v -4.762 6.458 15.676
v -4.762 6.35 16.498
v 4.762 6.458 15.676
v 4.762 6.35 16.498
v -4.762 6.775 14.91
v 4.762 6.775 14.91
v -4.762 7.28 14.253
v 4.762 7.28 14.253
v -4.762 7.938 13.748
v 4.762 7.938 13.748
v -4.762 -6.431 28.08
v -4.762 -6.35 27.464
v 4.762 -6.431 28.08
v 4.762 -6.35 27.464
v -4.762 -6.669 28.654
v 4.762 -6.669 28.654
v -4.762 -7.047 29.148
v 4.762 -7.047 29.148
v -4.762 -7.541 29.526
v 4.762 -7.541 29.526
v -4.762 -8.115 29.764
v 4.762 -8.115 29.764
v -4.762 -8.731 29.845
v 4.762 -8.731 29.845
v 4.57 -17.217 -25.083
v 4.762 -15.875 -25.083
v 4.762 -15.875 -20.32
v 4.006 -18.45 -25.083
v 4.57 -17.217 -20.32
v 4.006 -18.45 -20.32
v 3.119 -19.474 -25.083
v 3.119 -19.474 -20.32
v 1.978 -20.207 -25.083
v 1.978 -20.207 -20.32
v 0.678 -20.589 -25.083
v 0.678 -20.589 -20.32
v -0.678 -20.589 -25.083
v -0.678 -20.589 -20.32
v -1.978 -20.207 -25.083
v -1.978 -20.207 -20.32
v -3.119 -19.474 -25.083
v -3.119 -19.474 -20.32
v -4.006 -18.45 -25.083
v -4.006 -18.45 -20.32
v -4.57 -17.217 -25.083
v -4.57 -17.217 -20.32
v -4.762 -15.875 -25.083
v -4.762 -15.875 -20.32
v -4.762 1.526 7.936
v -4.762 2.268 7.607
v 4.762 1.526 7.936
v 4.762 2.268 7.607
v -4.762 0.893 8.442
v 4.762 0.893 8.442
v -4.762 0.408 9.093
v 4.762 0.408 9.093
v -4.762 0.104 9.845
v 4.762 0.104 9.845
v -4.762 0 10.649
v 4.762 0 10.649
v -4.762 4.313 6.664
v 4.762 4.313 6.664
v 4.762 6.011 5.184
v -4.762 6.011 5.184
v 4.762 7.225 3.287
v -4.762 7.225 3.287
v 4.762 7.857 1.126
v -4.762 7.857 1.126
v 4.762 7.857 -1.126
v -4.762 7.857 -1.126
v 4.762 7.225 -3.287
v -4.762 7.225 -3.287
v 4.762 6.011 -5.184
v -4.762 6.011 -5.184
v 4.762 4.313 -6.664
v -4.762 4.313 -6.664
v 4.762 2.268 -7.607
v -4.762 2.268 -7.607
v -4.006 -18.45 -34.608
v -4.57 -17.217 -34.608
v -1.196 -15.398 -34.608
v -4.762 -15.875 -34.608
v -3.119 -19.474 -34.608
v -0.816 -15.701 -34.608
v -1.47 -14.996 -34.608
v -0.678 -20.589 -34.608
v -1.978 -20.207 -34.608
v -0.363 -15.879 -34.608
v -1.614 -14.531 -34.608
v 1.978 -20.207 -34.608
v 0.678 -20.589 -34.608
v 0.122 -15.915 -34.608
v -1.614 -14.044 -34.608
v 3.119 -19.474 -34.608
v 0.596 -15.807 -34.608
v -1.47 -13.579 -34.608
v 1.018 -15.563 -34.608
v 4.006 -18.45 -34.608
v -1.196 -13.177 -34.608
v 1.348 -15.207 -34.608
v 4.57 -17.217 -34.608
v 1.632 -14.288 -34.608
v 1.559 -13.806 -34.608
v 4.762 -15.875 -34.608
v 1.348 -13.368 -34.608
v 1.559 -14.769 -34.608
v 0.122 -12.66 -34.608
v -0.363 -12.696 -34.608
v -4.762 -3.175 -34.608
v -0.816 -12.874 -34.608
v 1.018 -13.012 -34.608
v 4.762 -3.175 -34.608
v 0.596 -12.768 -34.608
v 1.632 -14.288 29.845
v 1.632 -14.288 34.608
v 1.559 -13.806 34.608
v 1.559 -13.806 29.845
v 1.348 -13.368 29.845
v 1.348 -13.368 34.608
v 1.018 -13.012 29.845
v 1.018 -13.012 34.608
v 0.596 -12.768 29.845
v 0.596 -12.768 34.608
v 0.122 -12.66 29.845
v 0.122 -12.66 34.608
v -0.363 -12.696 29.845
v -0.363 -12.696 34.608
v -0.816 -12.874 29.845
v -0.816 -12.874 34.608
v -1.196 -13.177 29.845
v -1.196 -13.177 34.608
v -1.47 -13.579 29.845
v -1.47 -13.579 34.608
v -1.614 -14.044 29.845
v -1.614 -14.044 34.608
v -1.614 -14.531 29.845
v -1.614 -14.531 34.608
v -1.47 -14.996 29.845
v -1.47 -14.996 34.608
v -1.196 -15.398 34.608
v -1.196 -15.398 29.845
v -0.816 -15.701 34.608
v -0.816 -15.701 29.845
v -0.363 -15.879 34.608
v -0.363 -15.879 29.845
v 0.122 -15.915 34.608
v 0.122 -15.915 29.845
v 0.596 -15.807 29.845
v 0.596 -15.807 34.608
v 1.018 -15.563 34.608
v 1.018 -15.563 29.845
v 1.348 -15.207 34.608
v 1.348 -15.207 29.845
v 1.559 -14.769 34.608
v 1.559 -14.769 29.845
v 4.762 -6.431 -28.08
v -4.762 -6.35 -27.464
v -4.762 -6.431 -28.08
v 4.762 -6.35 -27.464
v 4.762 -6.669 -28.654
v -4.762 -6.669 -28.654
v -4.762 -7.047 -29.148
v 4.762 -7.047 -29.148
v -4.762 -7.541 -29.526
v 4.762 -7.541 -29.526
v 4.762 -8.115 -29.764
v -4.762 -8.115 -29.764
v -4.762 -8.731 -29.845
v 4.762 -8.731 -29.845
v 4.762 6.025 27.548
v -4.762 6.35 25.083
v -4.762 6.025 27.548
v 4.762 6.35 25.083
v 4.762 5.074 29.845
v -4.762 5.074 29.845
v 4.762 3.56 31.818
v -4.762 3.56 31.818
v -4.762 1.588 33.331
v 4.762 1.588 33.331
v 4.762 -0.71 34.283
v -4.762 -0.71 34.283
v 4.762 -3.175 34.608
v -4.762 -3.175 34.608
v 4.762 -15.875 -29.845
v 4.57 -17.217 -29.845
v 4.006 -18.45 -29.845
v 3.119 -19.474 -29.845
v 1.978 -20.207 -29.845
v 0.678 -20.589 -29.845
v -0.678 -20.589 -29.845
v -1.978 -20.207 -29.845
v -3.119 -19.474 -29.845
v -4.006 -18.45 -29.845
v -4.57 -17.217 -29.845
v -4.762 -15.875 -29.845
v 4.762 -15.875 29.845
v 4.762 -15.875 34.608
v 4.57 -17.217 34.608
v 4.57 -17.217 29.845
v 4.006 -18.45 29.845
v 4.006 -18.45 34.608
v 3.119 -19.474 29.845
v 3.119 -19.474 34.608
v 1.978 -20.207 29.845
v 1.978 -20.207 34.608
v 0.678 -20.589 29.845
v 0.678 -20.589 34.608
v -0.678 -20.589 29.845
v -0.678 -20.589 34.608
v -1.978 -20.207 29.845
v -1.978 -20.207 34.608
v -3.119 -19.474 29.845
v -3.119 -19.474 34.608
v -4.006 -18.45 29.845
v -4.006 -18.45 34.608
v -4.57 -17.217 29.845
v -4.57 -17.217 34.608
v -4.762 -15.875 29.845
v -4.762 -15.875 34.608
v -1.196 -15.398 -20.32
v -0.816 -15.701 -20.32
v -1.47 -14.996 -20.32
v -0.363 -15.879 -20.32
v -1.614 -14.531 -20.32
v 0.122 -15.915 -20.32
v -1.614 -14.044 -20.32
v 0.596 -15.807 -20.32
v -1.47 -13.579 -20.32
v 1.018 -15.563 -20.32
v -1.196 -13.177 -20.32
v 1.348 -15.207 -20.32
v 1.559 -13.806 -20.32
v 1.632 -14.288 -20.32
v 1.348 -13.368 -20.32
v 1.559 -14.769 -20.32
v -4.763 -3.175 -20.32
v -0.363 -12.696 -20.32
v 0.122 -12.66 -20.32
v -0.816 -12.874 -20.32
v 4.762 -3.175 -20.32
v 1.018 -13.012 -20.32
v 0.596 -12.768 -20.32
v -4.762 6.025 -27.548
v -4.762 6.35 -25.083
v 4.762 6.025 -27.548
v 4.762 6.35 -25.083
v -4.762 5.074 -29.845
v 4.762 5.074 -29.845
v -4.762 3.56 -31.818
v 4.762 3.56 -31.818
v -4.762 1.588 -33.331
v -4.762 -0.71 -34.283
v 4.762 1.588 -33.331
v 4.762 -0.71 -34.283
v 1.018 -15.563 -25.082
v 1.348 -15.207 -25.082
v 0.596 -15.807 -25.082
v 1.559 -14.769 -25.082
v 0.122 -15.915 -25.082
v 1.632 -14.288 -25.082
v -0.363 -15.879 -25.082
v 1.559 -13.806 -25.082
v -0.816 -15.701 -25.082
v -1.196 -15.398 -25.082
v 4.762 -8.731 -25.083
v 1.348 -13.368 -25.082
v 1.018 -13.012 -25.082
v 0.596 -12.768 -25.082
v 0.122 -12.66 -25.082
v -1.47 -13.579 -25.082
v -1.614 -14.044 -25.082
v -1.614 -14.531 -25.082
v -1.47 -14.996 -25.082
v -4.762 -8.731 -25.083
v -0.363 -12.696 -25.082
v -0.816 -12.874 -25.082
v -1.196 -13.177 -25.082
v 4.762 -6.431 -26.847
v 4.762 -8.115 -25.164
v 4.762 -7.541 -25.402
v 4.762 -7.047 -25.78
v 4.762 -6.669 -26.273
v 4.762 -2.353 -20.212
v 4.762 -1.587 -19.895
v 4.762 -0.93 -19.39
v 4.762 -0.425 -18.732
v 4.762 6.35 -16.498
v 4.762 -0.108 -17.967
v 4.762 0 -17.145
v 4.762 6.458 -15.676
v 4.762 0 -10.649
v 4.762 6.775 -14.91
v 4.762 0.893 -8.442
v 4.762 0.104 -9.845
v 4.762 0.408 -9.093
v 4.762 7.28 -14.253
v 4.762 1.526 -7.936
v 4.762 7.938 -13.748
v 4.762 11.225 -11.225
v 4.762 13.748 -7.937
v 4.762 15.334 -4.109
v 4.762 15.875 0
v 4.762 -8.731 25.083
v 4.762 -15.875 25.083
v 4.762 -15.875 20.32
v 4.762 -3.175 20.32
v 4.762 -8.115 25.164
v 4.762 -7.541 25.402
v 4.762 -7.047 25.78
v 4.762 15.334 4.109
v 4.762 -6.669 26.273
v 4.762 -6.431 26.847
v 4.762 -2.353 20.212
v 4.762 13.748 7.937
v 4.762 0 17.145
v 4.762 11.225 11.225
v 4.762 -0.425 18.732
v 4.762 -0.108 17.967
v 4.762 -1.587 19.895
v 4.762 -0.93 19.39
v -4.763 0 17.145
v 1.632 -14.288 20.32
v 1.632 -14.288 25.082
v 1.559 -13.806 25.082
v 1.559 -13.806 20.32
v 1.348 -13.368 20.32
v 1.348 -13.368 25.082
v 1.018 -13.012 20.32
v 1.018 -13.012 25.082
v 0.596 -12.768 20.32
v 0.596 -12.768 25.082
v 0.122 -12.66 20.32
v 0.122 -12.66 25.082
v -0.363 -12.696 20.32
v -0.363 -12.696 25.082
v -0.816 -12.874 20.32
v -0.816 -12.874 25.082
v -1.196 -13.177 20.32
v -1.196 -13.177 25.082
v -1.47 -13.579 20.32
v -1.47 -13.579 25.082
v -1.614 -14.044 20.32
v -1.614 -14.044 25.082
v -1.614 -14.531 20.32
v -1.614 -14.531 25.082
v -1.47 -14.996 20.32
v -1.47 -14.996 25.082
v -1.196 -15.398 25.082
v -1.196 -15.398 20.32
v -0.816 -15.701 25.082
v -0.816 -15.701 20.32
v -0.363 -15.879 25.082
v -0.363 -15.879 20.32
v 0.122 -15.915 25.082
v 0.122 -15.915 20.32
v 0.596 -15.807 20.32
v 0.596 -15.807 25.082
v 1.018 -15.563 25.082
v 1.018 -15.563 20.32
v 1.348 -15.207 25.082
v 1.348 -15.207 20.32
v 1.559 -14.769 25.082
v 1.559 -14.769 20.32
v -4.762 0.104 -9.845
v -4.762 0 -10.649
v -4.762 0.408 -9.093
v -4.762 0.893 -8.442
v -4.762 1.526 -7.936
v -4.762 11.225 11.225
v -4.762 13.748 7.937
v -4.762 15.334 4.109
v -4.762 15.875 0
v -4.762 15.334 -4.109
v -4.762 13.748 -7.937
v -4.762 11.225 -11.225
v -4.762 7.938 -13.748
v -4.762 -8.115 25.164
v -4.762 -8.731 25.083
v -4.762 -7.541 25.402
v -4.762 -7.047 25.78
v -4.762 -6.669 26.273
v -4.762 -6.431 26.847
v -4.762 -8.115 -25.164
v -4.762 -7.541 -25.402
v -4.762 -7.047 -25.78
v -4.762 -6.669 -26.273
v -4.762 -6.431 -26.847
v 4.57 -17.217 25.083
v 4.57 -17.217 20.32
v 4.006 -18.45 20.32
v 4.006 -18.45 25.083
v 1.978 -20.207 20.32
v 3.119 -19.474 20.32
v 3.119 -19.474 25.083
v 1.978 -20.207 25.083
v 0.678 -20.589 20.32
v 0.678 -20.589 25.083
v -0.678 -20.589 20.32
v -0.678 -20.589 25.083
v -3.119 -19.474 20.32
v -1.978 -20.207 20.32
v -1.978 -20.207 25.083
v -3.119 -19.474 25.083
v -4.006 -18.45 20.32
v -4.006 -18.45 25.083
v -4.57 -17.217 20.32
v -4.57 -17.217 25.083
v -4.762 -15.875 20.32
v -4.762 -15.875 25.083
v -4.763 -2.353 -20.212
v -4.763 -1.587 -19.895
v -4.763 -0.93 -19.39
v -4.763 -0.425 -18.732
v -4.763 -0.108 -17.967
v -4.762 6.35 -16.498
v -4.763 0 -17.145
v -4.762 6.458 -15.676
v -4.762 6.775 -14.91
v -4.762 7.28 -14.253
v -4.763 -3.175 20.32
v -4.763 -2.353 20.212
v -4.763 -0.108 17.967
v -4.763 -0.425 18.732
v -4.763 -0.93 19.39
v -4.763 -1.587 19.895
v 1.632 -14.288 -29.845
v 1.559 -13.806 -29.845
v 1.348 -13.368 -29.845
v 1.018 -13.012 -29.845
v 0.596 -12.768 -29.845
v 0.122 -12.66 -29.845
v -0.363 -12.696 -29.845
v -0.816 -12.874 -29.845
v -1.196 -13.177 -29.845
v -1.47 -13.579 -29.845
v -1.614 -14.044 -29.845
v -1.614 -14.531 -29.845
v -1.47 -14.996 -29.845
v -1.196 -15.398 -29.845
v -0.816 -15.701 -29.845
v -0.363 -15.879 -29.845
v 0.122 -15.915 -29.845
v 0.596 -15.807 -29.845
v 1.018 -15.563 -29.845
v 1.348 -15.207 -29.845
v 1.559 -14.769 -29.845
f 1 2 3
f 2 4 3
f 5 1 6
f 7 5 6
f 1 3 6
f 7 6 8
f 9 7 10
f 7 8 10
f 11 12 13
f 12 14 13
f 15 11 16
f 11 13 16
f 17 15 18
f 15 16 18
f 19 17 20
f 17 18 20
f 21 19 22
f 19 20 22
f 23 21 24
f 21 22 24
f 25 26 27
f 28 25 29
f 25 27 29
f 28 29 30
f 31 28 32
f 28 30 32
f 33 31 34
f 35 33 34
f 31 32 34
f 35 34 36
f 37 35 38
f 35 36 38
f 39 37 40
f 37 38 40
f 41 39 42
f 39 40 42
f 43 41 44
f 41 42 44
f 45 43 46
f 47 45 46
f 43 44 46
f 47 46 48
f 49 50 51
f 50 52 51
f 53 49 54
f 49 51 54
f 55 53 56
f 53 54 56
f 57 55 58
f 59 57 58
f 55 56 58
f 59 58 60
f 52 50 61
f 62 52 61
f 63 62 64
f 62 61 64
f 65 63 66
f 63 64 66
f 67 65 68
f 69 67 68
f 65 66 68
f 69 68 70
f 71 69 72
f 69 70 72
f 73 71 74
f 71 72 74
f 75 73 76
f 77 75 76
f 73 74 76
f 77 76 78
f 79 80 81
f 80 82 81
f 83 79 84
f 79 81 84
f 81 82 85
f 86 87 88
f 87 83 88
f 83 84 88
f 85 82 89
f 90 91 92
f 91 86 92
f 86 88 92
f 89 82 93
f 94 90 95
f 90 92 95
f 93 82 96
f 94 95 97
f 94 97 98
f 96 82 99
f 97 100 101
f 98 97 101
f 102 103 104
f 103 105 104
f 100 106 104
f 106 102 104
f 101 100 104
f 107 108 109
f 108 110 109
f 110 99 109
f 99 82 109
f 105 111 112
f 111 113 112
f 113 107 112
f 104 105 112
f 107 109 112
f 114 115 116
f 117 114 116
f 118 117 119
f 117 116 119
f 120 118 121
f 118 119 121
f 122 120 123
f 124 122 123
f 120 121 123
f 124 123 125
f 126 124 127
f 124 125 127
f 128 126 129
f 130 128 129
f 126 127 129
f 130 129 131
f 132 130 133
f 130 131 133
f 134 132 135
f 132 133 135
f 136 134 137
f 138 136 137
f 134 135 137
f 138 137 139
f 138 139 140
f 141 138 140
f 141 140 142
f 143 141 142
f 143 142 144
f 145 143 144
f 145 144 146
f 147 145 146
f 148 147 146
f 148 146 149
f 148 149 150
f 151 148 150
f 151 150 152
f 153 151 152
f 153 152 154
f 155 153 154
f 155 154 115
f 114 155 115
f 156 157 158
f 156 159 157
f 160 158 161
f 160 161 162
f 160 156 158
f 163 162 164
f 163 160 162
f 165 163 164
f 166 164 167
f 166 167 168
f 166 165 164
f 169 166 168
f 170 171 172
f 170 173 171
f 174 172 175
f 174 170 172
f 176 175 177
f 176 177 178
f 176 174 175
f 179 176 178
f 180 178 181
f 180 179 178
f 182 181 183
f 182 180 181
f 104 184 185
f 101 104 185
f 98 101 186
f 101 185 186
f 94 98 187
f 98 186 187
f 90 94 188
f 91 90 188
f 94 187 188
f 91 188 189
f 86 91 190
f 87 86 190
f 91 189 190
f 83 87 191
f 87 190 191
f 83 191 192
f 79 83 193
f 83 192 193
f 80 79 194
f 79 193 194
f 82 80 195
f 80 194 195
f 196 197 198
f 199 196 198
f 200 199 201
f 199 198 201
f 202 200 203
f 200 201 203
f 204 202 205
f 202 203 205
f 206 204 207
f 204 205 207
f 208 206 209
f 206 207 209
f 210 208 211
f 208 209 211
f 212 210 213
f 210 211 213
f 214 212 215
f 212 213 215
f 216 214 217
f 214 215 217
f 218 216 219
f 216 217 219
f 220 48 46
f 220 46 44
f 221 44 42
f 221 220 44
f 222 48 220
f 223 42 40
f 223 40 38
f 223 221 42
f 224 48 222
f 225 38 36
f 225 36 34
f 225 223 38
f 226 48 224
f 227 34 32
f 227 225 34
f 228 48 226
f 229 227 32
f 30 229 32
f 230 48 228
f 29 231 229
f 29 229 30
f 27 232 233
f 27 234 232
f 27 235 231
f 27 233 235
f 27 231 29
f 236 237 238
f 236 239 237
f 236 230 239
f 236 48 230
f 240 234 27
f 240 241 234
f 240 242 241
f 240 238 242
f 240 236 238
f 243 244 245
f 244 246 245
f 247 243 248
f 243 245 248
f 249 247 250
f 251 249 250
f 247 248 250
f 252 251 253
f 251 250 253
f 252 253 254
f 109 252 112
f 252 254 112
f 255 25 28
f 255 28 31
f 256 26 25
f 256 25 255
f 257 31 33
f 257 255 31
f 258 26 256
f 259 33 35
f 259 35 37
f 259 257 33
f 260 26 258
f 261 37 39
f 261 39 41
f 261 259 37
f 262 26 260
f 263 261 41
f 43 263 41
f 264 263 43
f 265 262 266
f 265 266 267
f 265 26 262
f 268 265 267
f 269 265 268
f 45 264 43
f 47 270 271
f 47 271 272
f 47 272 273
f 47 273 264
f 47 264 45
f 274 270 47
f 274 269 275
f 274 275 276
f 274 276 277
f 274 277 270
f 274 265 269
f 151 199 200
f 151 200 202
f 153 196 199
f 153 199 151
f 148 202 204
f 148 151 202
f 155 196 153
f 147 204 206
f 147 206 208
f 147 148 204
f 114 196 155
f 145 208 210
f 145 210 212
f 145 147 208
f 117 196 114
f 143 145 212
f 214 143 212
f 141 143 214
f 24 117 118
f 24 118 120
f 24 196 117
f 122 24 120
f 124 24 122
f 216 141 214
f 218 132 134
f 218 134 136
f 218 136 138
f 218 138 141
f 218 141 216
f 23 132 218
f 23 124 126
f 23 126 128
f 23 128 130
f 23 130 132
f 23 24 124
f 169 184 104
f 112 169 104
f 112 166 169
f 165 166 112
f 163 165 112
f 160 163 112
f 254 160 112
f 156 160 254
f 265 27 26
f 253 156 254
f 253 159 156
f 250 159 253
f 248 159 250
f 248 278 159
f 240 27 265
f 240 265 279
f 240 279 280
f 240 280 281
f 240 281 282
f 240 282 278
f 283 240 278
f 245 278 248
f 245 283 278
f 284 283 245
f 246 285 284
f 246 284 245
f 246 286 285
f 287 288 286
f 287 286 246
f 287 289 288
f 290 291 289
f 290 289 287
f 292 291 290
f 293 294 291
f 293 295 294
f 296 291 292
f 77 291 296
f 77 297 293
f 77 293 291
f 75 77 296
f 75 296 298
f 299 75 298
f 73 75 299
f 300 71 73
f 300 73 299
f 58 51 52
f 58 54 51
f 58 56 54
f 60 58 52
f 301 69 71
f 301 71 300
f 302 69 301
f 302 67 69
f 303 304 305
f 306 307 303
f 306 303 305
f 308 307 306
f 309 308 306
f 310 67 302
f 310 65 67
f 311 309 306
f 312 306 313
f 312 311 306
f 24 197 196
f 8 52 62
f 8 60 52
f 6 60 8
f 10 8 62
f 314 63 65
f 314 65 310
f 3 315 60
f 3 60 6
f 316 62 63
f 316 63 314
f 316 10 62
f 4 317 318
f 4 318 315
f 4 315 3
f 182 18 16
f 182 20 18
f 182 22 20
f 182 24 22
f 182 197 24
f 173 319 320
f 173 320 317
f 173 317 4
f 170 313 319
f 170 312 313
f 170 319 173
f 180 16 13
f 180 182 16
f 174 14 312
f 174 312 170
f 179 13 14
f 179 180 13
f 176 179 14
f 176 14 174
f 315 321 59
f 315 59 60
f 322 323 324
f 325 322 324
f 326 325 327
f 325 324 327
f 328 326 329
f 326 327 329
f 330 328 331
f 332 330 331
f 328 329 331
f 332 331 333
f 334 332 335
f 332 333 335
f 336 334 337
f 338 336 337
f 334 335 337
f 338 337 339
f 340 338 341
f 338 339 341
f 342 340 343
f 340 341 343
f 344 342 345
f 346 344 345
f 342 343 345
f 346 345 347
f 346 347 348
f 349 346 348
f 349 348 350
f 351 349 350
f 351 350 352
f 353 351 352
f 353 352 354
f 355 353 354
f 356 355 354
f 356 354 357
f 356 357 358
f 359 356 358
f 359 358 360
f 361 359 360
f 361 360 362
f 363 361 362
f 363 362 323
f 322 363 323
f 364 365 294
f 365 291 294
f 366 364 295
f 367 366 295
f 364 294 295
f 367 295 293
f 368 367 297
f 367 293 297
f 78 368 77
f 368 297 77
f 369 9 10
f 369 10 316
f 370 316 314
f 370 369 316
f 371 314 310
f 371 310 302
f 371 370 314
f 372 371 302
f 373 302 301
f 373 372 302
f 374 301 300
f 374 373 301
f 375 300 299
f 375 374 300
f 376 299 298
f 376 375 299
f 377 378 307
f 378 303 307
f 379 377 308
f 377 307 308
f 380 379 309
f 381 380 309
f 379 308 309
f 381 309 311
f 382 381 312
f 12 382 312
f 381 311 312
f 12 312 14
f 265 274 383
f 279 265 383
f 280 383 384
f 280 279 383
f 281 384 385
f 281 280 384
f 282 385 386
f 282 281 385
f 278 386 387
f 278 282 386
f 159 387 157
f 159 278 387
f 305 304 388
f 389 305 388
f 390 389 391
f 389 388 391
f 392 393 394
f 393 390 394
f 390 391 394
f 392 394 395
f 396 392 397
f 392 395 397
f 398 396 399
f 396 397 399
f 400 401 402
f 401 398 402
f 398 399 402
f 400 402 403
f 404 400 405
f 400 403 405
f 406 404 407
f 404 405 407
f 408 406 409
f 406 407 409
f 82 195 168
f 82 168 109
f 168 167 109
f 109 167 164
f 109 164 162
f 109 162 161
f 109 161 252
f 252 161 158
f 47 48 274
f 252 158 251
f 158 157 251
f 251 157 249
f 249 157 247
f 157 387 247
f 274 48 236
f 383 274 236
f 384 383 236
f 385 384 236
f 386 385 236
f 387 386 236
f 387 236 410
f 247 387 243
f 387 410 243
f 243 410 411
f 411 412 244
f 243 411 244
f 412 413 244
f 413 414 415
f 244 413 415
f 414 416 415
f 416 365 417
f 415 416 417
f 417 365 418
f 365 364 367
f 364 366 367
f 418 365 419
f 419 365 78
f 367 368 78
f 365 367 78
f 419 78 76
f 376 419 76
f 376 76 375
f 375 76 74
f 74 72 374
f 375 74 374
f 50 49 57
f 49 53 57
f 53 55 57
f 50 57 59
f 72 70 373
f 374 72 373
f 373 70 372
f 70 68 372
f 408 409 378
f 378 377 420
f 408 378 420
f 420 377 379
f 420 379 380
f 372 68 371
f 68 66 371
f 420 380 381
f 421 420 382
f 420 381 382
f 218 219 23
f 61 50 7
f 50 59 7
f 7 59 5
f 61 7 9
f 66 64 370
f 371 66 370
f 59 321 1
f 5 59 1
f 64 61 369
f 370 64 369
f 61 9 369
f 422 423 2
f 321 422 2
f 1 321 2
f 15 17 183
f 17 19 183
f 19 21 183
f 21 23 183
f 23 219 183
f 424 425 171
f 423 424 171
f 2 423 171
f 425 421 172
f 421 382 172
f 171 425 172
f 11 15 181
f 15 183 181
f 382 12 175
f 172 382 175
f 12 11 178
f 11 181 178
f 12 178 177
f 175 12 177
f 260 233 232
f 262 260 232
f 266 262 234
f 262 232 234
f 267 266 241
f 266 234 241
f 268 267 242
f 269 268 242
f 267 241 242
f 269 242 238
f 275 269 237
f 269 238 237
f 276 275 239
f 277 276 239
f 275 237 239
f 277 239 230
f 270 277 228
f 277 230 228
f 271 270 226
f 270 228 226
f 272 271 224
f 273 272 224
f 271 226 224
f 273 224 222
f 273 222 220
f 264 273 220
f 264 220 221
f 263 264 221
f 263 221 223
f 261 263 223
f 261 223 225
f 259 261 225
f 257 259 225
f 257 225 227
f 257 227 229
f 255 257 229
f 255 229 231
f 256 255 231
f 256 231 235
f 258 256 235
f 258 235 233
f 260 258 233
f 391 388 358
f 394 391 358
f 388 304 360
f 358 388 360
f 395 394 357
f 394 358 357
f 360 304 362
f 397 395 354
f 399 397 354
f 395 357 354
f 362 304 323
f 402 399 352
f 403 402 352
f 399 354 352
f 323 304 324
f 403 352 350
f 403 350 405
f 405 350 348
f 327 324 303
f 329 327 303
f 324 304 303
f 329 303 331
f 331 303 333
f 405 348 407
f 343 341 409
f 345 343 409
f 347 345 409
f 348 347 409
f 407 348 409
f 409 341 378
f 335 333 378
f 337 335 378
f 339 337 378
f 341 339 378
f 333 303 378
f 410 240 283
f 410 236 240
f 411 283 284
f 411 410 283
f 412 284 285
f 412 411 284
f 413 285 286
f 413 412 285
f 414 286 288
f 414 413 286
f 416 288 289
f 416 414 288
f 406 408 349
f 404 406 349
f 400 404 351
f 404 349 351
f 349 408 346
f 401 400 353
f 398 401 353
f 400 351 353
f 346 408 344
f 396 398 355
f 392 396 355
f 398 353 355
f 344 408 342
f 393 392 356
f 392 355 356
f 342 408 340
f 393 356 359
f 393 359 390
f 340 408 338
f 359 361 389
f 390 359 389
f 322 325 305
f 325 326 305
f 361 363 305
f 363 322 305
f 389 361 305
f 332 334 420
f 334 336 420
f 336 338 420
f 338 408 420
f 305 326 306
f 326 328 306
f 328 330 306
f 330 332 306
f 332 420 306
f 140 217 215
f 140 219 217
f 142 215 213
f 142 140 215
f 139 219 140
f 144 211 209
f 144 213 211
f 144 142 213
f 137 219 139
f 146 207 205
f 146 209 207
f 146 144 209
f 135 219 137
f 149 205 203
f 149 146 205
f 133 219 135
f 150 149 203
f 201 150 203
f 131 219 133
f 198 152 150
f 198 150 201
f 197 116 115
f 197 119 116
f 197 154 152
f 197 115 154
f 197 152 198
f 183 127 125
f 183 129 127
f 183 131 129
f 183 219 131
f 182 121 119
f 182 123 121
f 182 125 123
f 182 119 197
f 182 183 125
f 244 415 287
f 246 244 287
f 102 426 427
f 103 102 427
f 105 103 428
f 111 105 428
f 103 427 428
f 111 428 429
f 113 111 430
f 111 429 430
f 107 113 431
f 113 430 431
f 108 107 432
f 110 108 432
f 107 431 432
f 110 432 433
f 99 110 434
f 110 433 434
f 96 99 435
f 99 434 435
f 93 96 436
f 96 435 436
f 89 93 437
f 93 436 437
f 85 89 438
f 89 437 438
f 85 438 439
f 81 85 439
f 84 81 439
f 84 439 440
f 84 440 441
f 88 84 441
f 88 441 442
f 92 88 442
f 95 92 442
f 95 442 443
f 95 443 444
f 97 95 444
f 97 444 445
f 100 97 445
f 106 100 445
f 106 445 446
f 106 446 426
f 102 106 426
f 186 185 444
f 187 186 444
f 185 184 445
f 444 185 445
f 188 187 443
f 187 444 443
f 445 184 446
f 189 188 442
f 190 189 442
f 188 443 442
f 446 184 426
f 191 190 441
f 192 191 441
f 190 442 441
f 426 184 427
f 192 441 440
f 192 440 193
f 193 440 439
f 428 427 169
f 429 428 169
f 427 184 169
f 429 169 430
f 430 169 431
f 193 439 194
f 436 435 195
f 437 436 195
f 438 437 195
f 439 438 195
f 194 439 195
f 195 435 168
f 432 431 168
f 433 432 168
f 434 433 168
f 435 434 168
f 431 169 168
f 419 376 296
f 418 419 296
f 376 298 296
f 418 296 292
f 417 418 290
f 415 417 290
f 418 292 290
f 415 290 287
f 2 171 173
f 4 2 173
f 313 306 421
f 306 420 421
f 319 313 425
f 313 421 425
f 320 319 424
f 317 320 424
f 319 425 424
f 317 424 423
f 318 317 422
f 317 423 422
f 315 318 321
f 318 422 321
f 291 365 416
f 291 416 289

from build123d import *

# Parameters (mm, degrees)
BOSS_EXTRUDE1_DEPTH   = 34.6075
CUT_EXTRUDE1_START    = -4.7625
CUT_EXTRUDE1_DEPTH    = 4.7625
CUT_EXTRUDE2_START    = 9.525
CUT_EXTRUDE2_DEPTH    = 4.7625
CUT_EXTRUDE3_START    = -4.7625
CUT_EXTRUDE3_DEPTH    = 40.64
BOSS_EXTRUDE3_START   = 34.6075
SKETCH7_W             = 9.525
SKETCH7_H             = 6.35
BOSS_EXTRUDE3_DEPTH   = 69.215
FILLET1_R             = 3.175
FILLET2_R             = 2.38125
FILLET3_R             = 2.38125
BOSS_EXTRUDE4_DEPTH   = 9.525
CUT_EXTRUDE4_DEPTH    = 42.40423997
FILLET4_R             = 3.175
FILLET5_R             = 9.525
F_4_CLEARANCE_HOLE1_D = 3.2639


with BuildPart() as part:
    # Sketch1 → Boss-Extrude1 (new, symmetric)
    with BuildSketch(Plane.XY):
        with BuildLine():
            Line((-4.7625, 0), (4.7625, 0))
            Line((4.7625, 0), (4.7625, -15.875))
            ThreePointArc((4.7625, -15.875), (0, -20.6375), (-4.7625, -15.875))
            Line((-4.7625, -15.875), (-4.7625, 0))
        make_face()
    extrude(amount=BOSS_EXTRUDE1_DEPTH, both=True)

    # Sketch2 → Cut-Extrude1 (cut)
    with BuildSketch(Plane.XY.offset(34.6075).offset(CUT_EXTRUDE1_START)):
        with BuildLine():
            Line((-4.7625, -15.875), (-4.7625, -6.35))
            Line((-4.7625, -6.35), (4.7625, -6.35))
            Line((4.7625, -6.35), (4.7625, -15.875))
            ThreePointArc((4.7625, -15.875), (0, -20.6375), (-4.7625, -15.875))
        make_face()
    extrude(amount=-CUT_EXTRUDE1_DEPTH, mode=Mode.SUBTRACT)

    # Sketch3 → Cut-Extrude2 (cut)
    with BuildSketch(Plane.XY.offset(-34.6075).offset(CUT_EXTRUDE2_START)):
        with BuildLine():
            Line((-4.7625, -15.875), (-4.7625, -6.35))
            Line((-4.7625, -6.35), (4.7625, -6.35))
            Line((4.7625, -6.35), (4.7625, -15.875))
            ThreePointArc((4.7625, -15.875), (0, -20.6375), (-4.7625, -15.875))
        make_face()
    extrude(amount=-CUT_EXTRUDE2_DEPTH, mode=Mode.SUBTRACT)

    # Sketch5 → Cut-Extrude3 (cut)
    with BuildSketch(Plane.XY.offset(25.0825).offset(CUT_EXTRUDE3_START)):
        with BuildLine():
            Line((4.7625, -15.875), (4.7625, 0))
            Line((4.7625, 0), (-4.7625, 0))
            Line((-4.7625, 0), (-4.7625, -15.875))
            ThreePointArc((-4.7625, -15.875), (0, -20.6375), (4.7625, -15.875))
        make_face()
    extrude(amount=-CUT_EXTRUDE3_DEPTH, mode=Mode.SUBTRACT)


with BuildPart() as cut_extrude3_piece_1:
    # of the separate pieces the step leaves, piece 1, a body of its own (cut_extrude3_pieces)
    add(part.part.solids().sort_by_distance((-4.7625, 0, 20.32))[0])



with BuildPart() as cut_extrude3_piece_2:
    # of the separate pieces the step leaves, piece 2, a body of its own (cut_extrude3_pieces)
    add(part.part.solids().sort_by_distance((-4.7625, -15.875, -34.6075))[0])


with BuildPart() as cut_extrude3_piece_1_1:
    add(cut_extrude3_piece_1.part)

    add(cut_extrude3_piece_2.part)  # Boss-Extrude3 merges Cut-Extrude3 piece 2
    # Sketch7 → Boss-Extrude3 (add)
    with BuildSketch(Plane.XY.offset(BOSS_EXTRUDE3_START)):
        with Locations((0, 3.175)):
            Rectangle(SKETCH7_W, SKETCH7_H)
    extrude(amount=-BOSS_EXTRUDE3_DEPTH)

    # Fillet1
    fillet1_edges = [cut_extrude3_piece_1_1.edges().sort_by_distance(p)[0] for p in [
        (0, 0, 20.32),
        (0, 0, -20.32),
    ]]
    fillet(fillet1_edges, radius=FILLET1_R)

    # Fillet2
    fillet2_edges = [cut_extrude3_piece_1_1.edges().sort_by_distance(p)[0] for p in [
        (0, -6.35, -25.0825),
        (0, -6.35, -29.845),
    ]]
    fillet(fillet2_edges, radius=FILLET2_R - 0.0001)  # a hair under: the kernel refuses the full size

    # Fillet3
    fillet3_edges = [cut_extrude3_piece_1_1.edges().sort_by_distance(p)[0] for p in [
        (0, -6.35, 29.845),
        (0, -6.35, 25.0825),
    ]]
    fillet(fillet3_edges, radius=FILLET3_R - 0.0001)  # a hair under: the kernel refuses the full size

    # Sketch8 → Boss-Extrude4 (add)
    with BuildSketch(Plane.ZY.offset(4.7625)):
        with BuildLine():
            Line((-14.549677831, 6.35), (14.549677831, 6.35))
            ThreePointArc((14.549677831, 6.35), (0, 15.875), (-14.549677831, 6.35))
        make_face()
    extrude(amount=-BOSS_EXTRUDE4_DEPTH)

    # Sketch9 → Cut-Extrude4 (cut, through all)
    with BuildSketch(Plane.ZY.offset(4.7625)):
        with BuildLine():
            Line((-7.9375, 0), (7.9375, 0))
            ThreePointArc((7.9375, 0), (0, 7.9375), (-7.9375, 0))
        make_face()
    extrude(amount=-CUT_EXTRUDE4_DEPTH, mode=Mode.SUBTRACT)

    # Fillet4
    fillet4_edges = [cut_extrude3_piece_1_1.edges().sort_by_distance(p)[0] for p in [
        (0, 6.35, -14.549677831),
        (0, 6.35, 14.549677831),
        (0, 0, -7.9375),
        (0, 0, 7.9375),
    ]]
    fillet(fillet4_edges, radius=FILLET4_R)

    # Fillet5
    fillet5_edges = [cut_extrude3_piece_1_1.edges().sort_by_distance(p)[0] for p in [
        (0, 6.35, 34.6075),
        (0, 6.35, -34.6075),
    ]]
    fillet(fillet5_edges, radius=FILLET5_R)

    # #4 Clearance Hole1 (through all)
    with Locations(Plane(origin=(0, 0, -34.6075), x_dir=(-1, 0, 0), z_dir=(0, 0, -1))):
        with Locations((0, -14.2875)):
            Hole(F_4_CLEARANCE_HOLE1_D / 2)


solid = cut_extrude3_piece_1_1.part
